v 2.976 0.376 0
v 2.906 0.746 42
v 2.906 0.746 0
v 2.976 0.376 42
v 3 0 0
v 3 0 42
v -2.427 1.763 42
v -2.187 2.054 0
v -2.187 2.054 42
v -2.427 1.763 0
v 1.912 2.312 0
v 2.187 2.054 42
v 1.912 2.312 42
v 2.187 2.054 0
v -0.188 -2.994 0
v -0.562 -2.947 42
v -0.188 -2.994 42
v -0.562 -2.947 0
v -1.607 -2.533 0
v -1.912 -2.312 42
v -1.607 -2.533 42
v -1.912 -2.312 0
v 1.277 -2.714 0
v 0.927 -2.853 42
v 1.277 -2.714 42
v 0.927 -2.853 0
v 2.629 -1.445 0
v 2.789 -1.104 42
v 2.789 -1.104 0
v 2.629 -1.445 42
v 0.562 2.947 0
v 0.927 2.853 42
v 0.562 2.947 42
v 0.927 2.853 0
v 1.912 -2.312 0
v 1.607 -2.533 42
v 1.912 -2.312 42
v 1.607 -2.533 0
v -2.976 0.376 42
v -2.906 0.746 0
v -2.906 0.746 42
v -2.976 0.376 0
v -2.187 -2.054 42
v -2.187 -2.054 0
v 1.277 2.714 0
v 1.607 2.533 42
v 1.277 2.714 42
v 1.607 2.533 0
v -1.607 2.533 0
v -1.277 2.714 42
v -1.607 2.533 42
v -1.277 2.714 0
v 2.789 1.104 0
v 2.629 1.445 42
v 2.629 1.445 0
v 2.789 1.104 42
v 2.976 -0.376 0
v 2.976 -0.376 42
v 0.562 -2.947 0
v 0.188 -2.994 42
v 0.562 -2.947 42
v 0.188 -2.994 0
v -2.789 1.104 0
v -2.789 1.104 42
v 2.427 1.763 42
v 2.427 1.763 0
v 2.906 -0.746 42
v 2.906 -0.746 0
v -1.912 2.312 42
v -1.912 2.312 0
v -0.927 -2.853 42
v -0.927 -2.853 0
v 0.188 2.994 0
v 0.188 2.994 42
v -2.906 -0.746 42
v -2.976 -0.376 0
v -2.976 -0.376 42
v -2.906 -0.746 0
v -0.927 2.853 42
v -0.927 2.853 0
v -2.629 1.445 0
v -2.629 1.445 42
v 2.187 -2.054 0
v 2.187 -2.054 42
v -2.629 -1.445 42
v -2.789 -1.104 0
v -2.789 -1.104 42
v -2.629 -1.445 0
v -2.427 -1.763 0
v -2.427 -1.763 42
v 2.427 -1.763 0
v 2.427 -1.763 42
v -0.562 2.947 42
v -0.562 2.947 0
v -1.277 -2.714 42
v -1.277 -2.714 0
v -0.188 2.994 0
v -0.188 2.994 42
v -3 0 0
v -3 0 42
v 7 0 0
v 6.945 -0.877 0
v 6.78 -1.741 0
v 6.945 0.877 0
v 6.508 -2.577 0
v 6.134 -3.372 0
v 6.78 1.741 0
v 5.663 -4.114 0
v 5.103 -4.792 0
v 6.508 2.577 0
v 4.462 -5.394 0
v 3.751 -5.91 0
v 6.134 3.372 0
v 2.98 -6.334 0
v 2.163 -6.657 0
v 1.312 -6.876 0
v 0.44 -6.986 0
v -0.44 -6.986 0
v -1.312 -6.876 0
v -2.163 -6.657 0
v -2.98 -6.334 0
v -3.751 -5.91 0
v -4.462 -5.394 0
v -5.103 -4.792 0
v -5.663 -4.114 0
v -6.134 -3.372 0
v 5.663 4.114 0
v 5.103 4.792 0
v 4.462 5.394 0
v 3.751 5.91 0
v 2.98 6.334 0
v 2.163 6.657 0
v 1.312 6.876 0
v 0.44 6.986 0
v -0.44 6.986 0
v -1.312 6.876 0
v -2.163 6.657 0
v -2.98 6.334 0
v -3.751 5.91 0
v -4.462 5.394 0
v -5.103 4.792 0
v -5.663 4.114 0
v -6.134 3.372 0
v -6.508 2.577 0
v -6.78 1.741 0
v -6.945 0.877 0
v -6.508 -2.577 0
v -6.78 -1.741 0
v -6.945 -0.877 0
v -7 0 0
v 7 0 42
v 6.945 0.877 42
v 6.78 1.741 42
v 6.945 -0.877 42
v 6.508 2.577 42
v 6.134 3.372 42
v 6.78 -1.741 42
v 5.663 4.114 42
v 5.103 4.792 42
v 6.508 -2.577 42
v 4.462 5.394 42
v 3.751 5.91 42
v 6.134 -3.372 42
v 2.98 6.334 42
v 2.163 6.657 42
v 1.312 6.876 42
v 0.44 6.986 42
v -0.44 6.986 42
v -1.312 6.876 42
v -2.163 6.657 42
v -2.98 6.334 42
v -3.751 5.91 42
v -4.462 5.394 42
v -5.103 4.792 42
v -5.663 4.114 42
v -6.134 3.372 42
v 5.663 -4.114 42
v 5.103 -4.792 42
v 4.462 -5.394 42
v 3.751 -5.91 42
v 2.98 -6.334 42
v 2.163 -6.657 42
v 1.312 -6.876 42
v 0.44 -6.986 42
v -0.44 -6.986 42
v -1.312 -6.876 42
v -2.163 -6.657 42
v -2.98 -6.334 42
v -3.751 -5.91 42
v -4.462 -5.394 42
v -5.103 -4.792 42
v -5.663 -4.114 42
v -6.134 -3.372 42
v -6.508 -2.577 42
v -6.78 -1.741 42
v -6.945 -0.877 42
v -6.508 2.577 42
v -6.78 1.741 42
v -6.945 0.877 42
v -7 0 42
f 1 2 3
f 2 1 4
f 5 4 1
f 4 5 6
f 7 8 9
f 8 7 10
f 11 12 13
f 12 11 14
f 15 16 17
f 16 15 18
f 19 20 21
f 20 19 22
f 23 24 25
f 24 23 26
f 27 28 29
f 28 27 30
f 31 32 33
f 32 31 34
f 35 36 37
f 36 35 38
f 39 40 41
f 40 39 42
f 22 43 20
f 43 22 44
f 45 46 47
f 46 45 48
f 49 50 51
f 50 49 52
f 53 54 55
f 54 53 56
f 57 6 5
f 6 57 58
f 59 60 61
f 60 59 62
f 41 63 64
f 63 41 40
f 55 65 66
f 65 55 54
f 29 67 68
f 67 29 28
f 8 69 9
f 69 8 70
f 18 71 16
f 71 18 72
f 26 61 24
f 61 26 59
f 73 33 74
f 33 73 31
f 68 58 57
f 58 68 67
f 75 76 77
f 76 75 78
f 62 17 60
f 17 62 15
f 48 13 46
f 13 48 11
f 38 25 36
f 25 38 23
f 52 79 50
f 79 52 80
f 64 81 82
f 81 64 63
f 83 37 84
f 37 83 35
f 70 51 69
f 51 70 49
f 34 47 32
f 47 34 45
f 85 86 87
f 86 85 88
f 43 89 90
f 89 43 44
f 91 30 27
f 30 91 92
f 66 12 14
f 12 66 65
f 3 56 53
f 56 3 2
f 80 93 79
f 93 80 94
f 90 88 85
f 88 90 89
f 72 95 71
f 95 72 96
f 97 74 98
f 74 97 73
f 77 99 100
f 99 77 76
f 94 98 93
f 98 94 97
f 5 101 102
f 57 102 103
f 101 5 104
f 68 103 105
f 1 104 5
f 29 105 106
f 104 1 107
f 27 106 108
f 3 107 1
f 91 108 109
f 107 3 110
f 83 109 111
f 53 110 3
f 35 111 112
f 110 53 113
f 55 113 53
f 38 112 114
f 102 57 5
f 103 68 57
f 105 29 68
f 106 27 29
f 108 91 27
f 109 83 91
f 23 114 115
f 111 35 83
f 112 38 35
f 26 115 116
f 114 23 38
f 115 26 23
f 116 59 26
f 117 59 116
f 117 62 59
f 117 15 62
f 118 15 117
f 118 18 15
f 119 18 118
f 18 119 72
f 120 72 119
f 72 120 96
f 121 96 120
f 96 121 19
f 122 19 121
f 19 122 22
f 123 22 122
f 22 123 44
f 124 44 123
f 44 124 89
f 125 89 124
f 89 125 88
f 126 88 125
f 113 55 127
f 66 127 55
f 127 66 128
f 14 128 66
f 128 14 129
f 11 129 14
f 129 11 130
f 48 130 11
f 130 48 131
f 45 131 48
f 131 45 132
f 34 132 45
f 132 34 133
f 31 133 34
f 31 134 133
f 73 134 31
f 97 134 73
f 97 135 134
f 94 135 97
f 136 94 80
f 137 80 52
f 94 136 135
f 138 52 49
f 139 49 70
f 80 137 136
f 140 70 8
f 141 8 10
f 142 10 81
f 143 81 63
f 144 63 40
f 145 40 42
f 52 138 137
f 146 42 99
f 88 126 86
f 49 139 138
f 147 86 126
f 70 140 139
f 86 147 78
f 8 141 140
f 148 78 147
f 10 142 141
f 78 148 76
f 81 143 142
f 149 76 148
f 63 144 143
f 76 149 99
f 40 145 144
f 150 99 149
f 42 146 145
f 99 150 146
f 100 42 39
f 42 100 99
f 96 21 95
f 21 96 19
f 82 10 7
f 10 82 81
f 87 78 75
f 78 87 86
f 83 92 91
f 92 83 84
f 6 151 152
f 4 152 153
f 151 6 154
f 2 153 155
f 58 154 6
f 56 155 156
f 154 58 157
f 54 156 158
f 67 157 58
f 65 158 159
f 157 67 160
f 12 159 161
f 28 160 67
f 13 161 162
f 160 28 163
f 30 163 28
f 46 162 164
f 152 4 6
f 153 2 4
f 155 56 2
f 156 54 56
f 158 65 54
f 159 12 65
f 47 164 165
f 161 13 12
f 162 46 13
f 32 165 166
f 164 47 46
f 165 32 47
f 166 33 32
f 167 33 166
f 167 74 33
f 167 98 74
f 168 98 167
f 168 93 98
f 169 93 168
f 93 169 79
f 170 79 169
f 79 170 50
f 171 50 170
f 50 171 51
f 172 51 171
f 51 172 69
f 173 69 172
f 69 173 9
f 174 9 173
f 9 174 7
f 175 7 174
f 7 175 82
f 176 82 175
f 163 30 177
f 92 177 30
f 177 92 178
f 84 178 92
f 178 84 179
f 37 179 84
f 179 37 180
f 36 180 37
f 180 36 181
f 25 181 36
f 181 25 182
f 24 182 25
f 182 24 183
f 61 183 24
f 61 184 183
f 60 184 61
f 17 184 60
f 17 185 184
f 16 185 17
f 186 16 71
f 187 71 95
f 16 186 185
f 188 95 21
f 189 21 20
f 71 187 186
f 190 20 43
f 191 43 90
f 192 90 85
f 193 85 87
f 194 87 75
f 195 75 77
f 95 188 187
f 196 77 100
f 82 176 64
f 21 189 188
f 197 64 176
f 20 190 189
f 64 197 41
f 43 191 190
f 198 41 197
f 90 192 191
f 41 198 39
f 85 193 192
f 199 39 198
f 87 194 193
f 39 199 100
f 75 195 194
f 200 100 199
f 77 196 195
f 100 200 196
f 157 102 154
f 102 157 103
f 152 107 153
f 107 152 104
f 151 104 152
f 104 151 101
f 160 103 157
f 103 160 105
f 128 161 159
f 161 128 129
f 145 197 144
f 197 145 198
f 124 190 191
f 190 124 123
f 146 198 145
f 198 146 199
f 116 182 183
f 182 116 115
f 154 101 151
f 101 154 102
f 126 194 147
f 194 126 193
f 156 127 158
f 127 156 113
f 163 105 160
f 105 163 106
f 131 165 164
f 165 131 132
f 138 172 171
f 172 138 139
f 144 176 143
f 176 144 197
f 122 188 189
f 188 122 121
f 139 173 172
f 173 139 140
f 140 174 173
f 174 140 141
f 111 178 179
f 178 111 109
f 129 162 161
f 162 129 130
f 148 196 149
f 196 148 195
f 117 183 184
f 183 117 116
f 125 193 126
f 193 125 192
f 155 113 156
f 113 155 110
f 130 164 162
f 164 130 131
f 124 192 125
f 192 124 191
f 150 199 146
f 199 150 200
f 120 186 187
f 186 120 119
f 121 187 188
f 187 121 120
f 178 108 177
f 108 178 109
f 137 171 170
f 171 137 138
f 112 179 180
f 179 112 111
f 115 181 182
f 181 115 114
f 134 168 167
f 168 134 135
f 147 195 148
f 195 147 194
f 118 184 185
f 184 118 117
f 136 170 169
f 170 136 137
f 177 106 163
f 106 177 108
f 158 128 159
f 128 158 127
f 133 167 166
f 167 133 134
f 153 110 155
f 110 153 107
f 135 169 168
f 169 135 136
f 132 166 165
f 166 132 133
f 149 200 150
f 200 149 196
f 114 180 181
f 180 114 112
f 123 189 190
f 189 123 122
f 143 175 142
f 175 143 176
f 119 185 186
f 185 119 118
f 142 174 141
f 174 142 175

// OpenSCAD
$fn = 50;

difference() {
	union() {
		cylinder(h = 42, r = 7.0);
	}
	union() {
		cylinder(h = 42, r = 3.0);
		cylinder(h = 42, r = 1.5);
	}
}
